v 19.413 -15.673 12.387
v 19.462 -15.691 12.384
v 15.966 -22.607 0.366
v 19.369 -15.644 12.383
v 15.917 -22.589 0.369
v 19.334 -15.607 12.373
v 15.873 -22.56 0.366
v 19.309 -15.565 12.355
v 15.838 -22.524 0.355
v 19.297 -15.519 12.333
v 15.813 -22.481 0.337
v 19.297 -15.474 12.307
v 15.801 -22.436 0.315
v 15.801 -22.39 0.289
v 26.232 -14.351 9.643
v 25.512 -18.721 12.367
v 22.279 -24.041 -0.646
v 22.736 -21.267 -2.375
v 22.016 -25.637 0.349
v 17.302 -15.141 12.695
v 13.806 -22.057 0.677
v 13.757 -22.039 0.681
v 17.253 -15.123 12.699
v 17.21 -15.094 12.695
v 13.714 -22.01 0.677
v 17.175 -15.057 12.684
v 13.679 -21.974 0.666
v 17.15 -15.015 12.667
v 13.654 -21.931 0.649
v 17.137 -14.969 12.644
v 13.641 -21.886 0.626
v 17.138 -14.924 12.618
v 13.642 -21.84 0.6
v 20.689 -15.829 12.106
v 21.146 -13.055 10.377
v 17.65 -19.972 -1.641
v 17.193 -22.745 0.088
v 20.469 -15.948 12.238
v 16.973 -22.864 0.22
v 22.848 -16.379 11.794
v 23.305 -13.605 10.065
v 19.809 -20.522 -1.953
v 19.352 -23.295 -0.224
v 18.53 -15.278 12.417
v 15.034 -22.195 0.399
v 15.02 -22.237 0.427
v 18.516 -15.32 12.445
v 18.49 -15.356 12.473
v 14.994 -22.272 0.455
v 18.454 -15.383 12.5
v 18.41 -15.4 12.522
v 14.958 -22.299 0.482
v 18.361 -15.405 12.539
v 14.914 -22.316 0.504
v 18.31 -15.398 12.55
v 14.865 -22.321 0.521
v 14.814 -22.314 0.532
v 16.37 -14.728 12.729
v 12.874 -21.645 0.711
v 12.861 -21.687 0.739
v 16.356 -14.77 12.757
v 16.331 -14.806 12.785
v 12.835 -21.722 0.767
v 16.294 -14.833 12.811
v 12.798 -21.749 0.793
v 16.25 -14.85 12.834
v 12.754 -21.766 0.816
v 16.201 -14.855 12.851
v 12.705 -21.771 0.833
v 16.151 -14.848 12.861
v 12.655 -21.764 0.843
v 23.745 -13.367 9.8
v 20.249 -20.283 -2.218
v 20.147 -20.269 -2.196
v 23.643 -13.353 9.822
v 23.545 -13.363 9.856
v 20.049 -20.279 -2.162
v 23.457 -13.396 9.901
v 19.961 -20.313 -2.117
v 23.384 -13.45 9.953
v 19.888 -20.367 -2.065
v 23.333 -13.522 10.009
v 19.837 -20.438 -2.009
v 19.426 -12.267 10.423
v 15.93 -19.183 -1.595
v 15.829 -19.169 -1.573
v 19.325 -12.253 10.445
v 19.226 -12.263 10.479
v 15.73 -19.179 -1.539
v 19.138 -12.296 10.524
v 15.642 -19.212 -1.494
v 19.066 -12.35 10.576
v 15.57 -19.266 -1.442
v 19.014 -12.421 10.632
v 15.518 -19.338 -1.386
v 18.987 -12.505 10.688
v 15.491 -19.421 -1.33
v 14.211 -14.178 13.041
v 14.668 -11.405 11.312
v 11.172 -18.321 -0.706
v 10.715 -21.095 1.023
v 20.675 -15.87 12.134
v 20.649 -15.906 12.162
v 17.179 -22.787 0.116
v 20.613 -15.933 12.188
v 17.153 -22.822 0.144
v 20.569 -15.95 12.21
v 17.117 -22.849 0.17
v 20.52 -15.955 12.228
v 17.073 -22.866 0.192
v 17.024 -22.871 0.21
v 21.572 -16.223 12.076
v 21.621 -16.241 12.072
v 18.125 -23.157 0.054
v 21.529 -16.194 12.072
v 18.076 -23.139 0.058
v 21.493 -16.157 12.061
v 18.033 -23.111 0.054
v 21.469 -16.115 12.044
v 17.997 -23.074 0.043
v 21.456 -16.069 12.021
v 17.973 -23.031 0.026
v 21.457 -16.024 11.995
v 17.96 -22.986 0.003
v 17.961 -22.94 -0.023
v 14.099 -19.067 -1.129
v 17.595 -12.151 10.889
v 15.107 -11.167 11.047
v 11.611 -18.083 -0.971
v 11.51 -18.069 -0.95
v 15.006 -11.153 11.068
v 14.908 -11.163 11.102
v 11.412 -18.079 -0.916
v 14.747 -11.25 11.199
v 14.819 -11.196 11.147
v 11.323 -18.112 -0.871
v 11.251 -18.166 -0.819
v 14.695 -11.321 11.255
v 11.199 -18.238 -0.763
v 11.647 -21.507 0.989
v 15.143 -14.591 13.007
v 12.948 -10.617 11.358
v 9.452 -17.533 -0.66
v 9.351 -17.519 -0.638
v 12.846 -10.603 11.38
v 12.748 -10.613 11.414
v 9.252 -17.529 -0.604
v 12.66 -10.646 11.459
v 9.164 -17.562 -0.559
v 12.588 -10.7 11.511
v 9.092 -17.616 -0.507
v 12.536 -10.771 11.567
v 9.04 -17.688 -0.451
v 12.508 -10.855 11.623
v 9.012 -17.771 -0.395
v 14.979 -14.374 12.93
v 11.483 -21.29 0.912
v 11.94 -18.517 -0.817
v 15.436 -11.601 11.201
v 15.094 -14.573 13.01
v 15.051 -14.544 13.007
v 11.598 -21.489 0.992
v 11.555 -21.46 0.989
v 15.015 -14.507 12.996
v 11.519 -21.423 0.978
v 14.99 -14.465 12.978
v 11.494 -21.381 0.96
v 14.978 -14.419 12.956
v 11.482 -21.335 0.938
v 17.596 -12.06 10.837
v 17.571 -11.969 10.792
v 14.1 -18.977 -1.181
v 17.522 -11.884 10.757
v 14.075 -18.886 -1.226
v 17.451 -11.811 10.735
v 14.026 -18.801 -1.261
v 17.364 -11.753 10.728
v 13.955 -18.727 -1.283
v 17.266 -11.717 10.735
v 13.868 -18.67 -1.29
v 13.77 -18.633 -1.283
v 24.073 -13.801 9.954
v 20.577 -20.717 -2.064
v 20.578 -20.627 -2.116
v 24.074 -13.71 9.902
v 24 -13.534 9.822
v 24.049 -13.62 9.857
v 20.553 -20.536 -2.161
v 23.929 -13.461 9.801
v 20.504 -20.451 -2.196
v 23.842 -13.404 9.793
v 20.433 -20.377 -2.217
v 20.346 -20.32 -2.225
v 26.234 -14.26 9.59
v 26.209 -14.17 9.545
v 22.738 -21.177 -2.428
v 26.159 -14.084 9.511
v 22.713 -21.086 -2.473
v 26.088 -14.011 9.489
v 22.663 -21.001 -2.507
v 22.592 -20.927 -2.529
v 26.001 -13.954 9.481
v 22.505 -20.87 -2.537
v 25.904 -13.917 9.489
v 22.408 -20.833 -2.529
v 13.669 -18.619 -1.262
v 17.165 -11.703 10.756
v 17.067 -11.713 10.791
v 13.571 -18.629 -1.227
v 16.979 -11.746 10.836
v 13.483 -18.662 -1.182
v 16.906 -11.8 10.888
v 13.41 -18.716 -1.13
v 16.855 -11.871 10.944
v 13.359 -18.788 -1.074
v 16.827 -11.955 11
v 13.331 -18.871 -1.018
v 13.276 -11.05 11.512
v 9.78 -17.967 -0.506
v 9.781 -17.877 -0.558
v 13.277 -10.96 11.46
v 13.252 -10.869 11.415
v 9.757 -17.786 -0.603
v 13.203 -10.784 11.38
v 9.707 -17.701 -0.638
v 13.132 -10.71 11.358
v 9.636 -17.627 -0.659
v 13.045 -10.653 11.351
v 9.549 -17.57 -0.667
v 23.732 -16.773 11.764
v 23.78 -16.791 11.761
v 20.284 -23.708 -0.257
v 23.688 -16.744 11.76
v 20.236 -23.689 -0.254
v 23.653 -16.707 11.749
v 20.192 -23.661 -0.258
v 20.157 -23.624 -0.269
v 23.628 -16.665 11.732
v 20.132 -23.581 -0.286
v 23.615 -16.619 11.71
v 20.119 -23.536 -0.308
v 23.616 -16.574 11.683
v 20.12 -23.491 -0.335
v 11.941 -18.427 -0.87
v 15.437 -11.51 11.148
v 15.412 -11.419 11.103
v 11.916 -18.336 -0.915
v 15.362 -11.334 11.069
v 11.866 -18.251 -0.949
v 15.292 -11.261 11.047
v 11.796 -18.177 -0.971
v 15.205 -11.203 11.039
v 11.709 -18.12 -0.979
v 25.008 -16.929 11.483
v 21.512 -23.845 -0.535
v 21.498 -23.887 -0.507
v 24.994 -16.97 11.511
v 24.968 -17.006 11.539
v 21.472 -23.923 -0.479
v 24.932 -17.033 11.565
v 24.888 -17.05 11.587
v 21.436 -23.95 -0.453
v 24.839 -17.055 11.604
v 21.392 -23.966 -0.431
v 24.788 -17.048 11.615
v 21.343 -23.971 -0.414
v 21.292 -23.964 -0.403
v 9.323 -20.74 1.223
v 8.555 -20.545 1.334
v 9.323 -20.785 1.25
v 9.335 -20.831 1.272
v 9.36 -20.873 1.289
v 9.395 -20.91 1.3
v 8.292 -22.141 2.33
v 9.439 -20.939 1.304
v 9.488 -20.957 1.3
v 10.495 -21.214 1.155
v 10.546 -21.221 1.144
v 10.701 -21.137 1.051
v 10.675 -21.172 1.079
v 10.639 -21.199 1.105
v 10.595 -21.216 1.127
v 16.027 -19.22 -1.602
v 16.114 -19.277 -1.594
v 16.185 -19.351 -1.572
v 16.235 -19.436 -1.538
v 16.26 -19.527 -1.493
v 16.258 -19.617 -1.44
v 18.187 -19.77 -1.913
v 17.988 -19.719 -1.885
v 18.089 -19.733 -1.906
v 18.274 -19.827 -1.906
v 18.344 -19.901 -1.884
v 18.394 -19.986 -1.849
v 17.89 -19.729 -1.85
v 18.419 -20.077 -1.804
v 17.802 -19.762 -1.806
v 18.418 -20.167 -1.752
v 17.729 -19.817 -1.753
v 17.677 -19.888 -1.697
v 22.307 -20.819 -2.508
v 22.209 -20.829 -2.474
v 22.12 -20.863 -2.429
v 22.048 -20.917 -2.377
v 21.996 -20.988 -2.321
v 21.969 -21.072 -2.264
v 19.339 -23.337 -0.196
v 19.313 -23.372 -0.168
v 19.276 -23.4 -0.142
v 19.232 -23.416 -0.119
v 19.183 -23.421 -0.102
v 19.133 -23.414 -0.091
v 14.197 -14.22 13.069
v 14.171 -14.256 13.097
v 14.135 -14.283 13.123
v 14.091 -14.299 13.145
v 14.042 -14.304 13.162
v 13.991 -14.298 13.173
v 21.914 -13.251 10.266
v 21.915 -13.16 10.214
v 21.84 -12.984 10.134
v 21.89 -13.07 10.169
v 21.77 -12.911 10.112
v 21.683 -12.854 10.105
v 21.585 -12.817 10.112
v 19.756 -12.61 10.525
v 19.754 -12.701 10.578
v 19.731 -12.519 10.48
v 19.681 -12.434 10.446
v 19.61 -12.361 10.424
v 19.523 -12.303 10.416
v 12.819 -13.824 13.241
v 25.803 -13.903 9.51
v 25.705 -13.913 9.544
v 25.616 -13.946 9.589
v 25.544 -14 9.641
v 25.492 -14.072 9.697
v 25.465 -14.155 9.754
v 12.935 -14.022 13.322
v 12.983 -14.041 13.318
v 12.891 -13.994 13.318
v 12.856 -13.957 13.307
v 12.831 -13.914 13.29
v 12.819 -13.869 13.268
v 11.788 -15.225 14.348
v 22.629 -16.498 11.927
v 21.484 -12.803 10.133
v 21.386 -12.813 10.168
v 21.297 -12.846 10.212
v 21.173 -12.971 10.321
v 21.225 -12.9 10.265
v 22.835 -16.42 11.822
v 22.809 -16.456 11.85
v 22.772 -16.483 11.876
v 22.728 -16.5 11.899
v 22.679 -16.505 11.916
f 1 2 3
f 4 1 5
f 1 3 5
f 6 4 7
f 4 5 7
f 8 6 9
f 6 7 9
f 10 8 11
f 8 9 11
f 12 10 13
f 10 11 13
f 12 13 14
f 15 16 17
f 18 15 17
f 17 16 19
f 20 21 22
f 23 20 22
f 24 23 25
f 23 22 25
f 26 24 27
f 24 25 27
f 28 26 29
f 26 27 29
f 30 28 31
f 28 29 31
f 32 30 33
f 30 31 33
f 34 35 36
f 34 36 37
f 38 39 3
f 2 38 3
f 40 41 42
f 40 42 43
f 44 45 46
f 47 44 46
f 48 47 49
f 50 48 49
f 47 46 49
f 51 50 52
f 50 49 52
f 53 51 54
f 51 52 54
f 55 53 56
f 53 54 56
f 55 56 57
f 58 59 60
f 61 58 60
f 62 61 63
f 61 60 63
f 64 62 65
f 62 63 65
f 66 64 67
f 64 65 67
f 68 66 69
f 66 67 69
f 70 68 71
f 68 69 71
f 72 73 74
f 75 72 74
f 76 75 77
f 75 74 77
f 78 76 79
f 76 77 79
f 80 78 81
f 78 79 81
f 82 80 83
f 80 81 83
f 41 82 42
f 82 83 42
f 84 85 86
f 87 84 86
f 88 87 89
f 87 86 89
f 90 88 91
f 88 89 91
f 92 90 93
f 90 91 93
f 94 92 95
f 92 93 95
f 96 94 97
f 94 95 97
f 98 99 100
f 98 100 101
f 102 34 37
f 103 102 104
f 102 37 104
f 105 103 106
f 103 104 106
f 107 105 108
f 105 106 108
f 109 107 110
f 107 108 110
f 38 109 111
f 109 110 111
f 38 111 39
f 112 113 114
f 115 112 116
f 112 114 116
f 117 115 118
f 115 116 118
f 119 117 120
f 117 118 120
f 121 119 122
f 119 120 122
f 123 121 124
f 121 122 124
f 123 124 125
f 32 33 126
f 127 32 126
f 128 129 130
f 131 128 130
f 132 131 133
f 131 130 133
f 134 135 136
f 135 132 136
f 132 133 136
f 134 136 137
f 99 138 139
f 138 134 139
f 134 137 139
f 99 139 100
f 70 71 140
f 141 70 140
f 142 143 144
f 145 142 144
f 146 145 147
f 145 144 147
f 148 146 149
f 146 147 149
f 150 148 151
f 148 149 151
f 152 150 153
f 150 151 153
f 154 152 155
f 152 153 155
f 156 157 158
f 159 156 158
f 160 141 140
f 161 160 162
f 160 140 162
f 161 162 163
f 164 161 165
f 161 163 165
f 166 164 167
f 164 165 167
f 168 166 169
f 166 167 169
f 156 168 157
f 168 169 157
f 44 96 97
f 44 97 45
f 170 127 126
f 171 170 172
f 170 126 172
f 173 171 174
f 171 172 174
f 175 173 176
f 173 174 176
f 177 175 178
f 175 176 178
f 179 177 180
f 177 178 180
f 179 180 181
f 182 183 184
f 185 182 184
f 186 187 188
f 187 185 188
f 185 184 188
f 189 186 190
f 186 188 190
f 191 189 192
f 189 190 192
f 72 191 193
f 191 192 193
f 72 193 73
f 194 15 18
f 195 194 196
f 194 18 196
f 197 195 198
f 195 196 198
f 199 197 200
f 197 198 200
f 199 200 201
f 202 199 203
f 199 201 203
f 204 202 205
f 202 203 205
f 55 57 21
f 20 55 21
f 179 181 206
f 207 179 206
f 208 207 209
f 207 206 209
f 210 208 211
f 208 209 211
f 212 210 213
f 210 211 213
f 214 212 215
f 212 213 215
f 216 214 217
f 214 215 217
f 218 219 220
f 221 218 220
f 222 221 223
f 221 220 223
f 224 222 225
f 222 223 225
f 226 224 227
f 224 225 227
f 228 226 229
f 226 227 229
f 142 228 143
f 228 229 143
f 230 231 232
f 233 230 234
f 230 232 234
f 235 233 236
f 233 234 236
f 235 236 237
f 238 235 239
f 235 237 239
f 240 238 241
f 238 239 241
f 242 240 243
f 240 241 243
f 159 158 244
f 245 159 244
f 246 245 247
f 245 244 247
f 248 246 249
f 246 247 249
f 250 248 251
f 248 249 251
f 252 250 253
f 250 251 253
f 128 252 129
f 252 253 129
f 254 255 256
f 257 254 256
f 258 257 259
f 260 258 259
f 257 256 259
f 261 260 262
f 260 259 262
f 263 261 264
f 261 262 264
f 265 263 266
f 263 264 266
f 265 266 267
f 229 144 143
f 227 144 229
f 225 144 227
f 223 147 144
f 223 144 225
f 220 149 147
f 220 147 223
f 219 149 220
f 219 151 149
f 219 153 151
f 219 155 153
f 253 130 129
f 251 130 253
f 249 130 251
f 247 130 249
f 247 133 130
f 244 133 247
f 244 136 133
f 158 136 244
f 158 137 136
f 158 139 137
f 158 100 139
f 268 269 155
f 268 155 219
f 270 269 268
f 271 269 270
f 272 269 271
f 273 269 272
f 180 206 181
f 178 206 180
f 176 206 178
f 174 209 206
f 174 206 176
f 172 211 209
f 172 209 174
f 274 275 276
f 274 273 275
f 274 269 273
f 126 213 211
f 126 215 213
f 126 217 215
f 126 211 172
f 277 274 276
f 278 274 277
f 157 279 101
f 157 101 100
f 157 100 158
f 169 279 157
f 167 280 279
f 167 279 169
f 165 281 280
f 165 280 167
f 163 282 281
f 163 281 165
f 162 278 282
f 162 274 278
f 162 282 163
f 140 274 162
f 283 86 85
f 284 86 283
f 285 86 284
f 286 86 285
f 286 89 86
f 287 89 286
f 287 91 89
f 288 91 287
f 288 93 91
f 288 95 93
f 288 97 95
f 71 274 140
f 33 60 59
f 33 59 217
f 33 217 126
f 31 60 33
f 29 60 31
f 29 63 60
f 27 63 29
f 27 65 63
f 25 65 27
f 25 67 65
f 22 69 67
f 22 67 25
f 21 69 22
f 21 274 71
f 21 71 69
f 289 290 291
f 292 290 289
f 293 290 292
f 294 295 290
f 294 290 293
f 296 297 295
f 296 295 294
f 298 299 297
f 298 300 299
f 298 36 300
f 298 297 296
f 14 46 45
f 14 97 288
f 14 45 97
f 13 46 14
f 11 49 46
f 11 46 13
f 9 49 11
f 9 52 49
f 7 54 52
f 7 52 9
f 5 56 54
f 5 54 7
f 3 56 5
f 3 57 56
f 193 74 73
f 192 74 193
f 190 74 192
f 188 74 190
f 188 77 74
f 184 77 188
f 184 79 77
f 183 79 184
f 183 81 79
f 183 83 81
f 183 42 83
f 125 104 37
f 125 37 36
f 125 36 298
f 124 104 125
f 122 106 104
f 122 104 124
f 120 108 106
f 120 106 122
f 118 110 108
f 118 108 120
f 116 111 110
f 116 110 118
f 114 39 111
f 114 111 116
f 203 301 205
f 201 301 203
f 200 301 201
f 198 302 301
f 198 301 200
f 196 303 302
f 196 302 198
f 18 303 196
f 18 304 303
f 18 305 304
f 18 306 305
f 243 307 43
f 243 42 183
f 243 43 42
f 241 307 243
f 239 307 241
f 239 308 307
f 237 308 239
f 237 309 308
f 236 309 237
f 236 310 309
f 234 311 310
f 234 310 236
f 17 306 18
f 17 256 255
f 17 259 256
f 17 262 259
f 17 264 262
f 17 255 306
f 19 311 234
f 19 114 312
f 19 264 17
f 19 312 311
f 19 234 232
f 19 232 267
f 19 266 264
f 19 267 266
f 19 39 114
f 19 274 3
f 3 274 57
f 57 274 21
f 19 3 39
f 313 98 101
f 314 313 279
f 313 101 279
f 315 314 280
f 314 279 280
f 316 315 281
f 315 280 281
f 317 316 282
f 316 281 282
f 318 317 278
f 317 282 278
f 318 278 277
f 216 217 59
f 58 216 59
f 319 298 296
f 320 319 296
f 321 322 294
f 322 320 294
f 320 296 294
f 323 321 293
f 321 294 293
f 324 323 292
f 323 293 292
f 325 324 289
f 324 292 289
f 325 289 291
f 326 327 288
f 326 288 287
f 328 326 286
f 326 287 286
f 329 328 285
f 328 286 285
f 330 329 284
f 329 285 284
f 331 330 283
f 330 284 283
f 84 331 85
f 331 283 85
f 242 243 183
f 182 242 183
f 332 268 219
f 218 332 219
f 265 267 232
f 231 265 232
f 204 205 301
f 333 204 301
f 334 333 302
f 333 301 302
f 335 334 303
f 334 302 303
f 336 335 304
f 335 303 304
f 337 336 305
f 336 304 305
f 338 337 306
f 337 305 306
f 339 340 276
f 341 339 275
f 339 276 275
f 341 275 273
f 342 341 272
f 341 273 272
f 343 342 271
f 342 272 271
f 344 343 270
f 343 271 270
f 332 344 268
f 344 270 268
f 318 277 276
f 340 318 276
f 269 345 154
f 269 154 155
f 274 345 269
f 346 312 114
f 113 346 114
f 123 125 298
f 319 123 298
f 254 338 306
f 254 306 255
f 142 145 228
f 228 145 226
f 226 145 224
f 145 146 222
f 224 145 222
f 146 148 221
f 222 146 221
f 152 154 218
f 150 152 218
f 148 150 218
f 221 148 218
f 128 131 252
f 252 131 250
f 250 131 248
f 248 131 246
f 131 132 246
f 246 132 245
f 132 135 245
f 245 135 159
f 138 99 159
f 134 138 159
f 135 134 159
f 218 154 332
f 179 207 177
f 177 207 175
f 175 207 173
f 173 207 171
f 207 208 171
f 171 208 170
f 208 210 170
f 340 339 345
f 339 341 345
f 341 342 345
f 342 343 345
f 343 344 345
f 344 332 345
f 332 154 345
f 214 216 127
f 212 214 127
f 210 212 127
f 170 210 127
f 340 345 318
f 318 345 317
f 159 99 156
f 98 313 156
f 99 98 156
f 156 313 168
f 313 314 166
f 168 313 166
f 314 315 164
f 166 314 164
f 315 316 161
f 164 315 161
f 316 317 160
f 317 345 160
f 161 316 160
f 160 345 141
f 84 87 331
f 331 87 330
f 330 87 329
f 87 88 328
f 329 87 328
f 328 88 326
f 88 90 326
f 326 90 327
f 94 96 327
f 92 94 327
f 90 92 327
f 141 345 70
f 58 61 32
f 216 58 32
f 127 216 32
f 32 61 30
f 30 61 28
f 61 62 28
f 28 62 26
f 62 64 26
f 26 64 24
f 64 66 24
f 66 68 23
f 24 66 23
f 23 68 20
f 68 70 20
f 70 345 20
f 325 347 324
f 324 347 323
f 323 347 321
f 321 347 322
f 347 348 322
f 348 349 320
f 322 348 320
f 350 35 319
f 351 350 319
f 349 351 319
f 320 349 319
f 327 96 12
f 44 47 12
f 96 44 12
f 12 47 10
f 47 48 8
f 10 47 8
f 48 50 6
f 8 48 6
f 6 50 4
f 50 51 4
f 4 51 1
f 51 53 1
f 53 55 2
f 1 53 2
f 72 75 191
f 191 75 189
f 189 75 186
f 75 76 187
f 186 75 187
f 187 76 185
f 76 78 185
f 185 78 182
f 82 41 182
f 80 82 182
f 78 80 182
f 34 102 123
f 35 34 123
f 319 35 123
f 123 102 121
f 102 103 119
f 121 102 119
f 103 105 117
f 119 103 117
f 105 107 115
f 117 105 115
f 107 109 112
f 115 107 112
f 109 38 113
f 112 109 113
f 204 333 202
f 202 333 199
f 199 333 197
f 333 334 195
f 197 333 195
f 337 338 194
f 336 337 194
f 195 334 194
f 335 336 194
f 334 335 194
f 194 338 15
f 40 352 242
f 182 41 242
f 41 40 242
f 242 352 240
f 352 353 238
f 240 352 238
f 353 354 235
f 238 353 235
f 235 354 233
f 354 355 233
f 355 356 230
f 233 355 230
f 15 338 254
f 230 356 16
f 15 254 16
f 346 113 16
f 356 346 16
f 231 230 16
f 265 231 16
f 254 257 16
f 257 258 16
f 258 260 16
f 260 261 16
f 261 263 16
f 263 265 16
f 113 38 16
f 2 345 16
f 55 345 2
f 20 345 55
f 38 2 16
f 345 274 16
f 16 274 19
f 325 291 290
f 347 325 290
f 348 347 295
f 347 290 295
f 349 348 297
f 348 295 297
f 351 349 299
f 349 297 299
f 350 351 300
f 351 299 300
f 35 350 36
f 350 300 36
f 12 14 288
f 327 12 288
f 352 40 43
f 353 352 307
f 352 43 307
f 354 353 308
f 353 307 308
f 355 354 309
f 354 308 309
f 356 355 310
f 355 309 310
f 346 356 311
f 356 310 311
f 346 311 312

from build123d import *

# Parameters (mm, degrees)
SKETCH2_W           = 14.3
SKETCH2_H           = 14.3
BOSS_EXTRUDE1_DEPTH = 5.6
CUT_EXTRUDE2_DEPTH  = 17.5
LPATTERN1_COUNT     = 5
LPATTERN1_PITCH     = 2.25
LPATTERN1_COL_COUNT = 4
LPATTERN1_COL_PITCH = 2.25


with BuildPart() as part:
    # Sketch2 → Boss-Extrude1 (new body)
    with BuildSketch(Plane(origin=(-2.586863131, -15.699309697, 9.787522701), x_dir=(0.9597170343404154, -0.24447167145746004, -0.13848038074627608), z_dir=(0.13848038074627628, 0.8404180176603395, -0.5239472680912))):
        with Locations((20.198681335, -0.426078635)):
            Rectangle(SKETCH2_W, SKETCH2_H)
    extrude(amount=BOSS_EXTRUDE1_DEPTH)

    # Sketch3 → Cut-Extrude2 (cut)
    with BuildSketch(Plane(origin=(-1.643808295, -3.252120737, -5.650904665), x_dir=(-0.9696564349576585, 0.12194238719709705, 0.21188782964077374), z_dir=(-0.24447167145746004, -0.4836643024316157, -0.8404180176603393))):
        with BuildLine():
            Line((-17.670554194, -16.169704918), (-17.199268448, -19.435878481))
            ThreePointArc((-17.199268448, -19.435878481), (-17.121093331, -19.567484364), (-16.972755762, -19.605265621))
            Line((-16.972755762, -19.605265621), (-15.93351872, -19.455311066))
            ThreePointArc((-15.93351872, -19.455311066), (-15.801912836, -19.377135948), (-15.764131579, -19.22879838))
            Line((-15.764131579, -19.22879838), (-16.235417325, -15.962624817))
            ThreePointArc((-16.235417325, -15.962624817), (-16.159854811, -15.665949681), (-15.896643044, -15.509599446))
            Line((-15.896643044, -15.509599446), (-18.123579565, -15.830930637))
            ThreePointArc((-18.123579565, -15.830930637), (-17.826904429, -15.906493151), (-17.670554194, -16.169704918))
        make_face()
    cut_extrude2 = extrude(amount=-CUT_EXTRUDE2_DEPTH, mode=Mode.SUBTRACT)

    # LPattern1: Cut-Extrude2 ×5
    with Locations(*[Vector(0.9597170343404154, -0.24447167145746015, -0.138480380746276) * (i * LPATTERN1_PITCH) for i in range(1, LPATTERN1_COUNT)]):
        add(cut_extrude2, mode=Mode.SUBTRACT)

    # LPattern1 col: Cut-Extrude2 ×4
    with Locations(*[Vector(-0.9597170343404154, 0.2444716714574598, 0.13848038074627622) * (i * LPATTERN1_COL_PITCH) for i in range(1, LPATTERN1_COL_COUNT)]):
        add(cut_extrude2, mode=Mode.SUBTRACT)


solid = part.part
